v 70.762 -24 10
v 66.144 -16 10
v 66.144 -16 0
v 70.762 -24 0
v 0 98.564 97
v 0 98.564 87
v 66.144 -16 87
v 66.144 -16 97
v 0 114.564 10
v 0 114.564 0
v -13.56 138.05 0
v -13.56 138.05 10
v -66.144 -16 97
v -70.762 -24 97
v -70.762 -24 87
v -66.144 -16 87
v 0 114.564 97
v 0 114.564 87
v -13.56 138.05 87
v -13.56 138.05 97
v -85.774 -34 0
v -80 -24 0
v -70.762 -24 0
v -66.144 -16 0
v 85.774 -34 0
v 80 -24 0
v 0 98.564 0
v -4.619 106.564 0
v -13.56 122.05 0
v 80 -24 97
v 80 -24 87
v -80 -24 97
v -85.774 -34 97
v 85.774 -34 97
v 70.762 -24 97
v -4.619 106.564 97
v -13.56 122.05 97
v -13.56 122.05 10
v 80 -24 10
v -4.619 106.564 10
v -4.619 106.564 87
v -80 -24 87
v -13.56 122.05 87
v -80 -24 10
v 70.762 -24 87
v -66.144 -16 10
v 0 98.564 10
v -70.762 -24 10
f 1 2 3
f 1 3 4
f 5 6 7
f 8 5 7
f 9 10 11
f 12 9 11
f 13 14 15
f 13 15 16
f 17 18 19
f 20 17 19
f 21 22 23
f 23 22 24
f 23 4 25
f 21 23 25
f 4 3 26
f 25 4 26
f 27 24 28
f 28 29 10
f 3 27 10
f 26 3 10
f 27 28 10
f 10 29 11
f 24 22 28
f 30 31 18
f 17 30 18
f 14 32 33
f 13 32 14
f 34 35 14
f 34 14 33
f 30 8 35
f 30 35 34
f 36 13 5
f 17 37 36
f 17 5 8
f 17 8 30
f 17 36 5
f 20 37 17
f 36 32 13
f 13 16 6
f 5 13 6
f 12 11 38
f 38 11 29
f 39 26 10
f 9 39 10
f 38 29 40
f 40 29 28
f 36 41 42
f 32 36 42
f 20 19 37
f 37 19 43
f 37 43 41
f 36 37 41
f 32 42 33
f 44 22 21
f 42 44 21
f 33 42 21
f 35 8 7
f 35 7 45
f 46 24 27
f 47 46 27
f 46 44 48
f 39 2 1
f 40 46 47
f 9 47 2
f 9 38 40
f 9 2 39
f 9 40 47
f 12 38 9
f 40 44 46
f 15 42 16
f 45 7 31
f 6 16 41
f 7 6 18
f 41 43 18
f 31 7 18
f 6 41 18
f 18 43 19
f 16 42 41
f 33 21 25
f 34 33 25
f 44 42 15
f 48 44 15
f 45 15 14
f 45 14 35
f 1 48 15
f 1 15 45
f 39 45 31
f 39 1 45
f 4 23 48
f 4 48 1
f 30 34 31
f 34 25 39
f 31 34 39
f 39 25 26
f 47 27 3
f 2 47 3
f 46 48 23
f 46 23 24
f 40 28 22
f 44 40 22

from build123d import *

# Parameters (mm, degrees)
F1_DEPTH = 97
F2_DEPTH = 87
F3_DEPTH = 10


with BuildPart() as f1:
    # F0 (on Top) → F1 (new body)
    with BuildSketch(Plane.XY):
        Polygon((-4.618802, 106.564065), (-80, -24), (-70.762396, -24), (-66.143594, -16), (0, 98.564065), (66.143594, -16), (70.762396, -24), (80, -24), (0, 114.564065), (-13.559861, 138.050432), (-13.559861, 122.050432), align=None)
        Polygon((-70.762396, -24), (-80, -24), (-85.773503, -34), (85.773503, -34), (80, -24), (70.762396, -24), align=None)
    extrude(amount=F1_DEPTH)

    # F0 (on Top) → F2 (cut)
    with BuildSketch(Plane.XY):
        Polygon((-4.618802, 106.564065), (-80, -24), (-70.762396, -24), (-66.143594, -16), (0, 98.564065), (66.143594, -16), (70.762396, -24), (80, -24), (0, 114.564065), (-13.559861, 138.050432), (-13.559861, 122.050432), align=None)
    extrude(amount=F2_DEPTH, mode=Mode.SUBTRACT)

    # F0 (on Top) → F3 (join)
    with BuildSketch(Plane.XY):
        Polygon((-4.618802, 106.564065), (-80, -24), (-70.762396, -24), (-66.143594, -16), (0, 98.564065), (66.143594, -16), (70.762396, -24), (80, -24), (0, 114.564065), (-13.559861, 138.050432), (-13.559861, 122.050432), align=None)
    extrude(amount=F3_DEPTH)


solid = f1.part
